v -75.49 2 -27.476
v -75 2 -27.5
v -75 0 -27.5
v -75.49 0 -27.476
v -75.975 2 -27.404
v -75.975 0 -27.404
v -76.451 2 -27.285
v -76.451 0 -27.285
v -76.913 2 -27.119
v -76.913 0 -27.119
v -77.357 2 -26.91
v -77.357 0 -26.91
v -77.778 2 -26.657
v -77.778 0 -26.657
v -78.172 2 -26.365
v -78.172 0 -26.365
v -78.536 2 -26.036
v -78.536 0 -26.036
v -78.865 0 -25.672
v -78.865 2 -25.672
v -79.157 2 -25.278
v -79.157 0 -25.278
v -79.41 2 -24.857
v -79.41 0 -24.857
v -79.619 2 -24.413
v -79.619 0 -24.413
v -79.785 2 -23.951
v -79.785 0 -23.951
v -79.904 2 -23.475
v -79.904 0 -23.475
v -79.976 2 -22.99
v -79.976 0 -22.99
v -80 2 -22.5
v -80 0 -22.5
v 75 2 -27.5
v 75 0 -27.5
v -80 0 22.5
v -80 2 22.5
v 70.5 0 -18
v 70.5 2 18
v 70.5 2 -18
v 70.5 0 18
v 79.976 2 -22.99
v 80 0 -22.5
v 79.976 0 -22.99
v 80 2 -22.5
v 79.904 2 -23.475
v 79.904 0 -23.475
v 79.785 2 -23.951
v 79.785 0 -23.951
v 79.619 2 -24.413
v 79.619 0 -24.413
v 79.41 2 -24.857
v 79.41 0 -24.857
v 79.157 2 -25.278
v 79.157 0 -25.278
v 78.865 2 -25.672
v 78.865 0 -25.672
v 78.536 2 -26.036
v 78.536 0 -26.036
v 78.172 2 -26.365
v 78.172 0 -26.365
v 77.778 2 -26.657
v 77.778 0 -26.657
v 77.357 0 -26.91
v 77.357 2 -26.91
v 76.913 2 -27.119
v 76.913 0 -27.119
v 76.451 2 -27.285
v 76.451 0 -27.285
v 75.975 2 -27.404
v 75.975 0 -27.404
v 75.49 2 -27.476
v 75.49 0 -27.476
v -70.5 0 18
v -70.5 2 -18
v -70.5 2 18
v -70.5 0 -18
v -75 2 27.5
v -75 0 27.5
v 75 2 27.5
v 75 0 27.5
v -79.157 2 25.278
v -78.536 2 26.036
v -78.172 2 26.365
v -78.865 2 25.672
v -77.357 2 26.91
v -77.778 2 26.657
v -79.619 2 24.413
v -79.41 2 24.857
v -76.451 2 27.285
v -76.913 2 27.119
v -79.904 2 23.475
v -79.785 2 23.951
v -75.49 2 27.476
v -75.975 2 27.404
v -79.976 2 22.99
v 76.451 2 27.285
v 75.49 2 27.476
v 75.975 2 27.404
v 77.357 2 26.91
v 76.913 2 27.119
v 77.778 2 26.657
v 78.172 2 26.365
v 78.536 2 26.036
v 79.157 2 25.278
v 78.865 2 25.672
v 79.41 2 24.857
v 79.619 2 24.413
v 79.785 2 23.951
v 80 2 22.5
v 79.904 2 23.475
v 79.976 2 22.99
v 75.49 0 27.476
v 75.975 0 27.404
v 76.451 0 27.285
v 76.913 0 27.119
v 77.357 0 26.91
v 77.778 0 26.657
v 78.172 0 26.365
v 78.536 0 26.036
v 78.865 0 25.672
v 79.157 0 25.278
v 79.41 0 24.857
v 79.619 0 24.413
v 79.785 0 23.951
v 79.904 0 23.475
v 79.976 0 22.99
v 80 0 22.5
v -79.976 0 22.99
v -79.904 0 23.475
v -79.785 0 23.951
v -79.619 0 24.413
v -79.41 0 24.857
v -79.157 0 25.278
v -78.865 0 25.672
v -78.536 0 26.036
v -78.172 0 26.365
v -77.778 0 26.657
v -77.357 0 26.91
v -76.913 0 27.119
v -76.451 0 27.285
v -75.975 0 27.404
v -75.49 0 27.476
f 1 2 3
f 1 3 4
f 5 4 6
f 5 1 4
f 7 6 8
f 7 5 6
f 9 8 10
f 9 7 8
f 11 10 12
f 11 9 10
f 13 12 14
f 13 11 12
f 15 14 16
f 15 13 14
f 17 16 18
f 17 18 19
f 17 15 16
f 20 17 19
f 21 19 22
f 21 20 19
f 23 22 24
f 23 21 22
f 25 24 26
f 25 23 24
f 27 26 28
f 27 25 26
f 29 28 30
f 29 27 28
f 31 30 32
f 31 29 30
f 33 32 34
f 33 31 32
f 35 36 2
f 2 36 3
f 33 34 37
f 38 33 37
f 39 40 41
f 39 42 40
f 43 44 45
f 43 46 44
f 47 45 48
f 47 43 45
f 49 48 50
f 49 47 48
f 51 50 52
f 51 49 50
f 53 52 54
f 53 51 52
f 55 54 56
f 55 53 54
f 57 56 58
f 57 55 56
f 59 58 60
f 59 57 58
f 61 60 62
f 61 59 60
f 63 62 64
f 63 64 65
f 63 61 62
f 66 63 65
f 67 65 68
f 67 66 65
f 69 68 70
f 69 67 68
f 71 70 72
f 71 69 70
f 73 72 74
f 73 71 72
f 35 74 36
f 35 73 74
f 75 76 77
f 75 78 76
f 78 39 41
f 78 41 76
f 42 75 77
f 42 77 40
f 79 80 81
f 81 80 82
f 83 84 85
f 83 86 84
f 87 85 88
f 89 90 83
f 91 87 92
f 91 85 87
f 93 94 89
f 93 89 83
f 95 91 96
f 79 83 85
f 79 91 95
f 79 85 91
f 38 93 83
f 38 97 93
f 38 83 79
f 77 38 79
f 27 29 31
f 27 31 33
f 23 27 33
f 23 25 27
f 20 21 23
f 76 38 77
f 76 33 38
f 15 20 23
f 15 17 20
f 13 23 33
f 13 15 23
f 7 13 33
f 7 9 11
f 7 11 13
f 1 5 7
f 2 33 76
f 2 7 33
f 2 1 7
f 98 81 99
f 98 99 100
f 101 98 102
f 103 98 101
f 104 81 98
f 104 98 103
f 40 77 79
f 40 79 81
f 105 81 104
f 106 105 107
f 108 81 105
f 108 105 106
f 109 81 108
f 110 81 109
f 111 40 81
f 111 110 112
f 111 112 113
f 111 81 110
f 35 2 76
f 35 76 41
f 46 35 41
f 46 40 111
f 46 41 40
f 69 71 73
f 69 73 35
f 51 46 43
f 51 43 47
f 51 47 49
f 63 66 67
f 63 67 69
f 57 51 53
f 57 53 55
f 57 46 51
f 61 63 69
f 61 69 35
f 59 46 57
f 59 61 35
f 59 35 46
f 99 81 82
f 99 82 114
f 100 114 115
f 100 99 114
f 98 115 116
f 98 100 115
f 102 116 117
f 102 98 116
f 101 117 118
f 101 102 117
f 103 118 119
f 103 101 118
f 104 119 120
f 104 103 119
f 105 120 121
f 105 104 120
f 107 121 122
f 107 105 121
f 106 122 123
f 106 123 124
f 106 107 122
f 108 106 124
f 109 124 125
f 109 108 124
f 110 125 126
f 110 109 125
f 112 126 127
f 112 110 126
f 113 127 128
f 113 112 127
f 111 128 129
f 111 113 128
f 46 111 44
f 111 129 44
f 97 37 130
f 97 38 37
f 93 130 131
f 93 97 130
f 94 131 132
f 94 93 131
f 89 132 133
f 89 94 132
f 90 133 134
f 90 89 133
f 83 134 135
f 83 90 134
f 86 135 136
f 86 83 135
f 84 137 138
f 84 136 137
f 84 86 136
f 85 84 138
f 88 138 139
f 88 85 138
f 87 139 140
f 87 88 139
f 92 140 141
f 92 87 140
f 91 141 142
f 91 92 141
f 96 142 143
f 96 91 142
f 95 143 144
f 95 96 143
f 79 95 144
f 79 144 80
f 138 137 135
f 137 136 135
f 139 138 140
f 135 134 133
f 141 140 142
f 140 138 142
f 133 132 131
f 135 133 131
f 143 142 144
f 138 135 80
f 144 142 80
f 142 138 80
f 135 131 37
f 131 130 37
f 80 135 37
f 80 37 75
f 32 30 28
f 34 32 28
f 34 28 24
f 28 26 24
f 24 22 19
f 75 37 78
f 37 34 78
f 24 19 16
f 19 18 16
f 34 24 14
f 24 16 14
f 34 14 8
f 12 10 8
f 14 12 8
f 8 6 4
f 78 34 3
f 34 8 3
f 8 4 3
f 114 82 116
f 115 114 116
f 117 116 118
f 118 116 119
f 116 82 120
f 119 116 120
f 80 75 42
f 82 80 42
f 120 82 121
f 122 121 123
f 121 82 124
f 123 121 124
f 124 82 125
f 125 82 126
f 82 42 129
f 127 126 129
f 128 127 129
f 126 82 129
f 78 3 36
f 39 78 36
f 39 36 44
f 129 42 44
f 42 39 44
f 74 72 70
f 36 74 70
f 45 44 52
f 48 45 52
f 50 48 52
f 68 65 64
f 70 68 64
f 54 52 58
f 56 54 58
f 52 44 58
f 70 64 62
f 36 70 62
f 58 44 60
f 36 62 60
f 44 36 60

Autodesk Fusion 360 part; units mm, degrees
sketch "Sketch1" plane through (0, 0, 0) normal (0, 1, 0) x (1, 0, 0)
  line L0 (70.5, 18) -> (-70.5, 18)
  line L1 (-70.5, 18) -> (-70.5, -18)
  line L2 (-70.5, -18) -> (70.5, -18)
  line L3 (70.5, -18) -> (70.5, 18)
  line L4 (70.5, 18) -> (-70.5, -18) construction
  line L5 (-70.5, 18) -> (70.5, -18) construction
  line L6 (80, 27.5) -> (-80, 27.5)
  line L7 (-80, 27.5) -> (-80, -27.5)
  line L8 (-80, -27.5) -> (80, -27.5)
  line L9 (80, -27.5) -> (80, 27.5)
  line L10 (80, 27.5) -> (-80, -27.5) construction
  line L11 (-80, 27.5) -> (80, -27.5) construction
  dimension "d1" = 141
  dimension "d2" = 36
  dimension "d3" = 160
  dimension "d4" = 55
extrude "Extrude1" add sketch "Sketch1" along normal blind 2
fillet "Fillet1" radius 5 1 edges at (-80, 1, 27.5)
fillet "Fillet2" radius 5 1 edges at (80, 1, 27.5)
fillet "Fillet3" radius 5 1 edges at (80, 1, -27.5)
fillet "Fillet4" radius 5 1 edges at (-80, 1, -27.5)
